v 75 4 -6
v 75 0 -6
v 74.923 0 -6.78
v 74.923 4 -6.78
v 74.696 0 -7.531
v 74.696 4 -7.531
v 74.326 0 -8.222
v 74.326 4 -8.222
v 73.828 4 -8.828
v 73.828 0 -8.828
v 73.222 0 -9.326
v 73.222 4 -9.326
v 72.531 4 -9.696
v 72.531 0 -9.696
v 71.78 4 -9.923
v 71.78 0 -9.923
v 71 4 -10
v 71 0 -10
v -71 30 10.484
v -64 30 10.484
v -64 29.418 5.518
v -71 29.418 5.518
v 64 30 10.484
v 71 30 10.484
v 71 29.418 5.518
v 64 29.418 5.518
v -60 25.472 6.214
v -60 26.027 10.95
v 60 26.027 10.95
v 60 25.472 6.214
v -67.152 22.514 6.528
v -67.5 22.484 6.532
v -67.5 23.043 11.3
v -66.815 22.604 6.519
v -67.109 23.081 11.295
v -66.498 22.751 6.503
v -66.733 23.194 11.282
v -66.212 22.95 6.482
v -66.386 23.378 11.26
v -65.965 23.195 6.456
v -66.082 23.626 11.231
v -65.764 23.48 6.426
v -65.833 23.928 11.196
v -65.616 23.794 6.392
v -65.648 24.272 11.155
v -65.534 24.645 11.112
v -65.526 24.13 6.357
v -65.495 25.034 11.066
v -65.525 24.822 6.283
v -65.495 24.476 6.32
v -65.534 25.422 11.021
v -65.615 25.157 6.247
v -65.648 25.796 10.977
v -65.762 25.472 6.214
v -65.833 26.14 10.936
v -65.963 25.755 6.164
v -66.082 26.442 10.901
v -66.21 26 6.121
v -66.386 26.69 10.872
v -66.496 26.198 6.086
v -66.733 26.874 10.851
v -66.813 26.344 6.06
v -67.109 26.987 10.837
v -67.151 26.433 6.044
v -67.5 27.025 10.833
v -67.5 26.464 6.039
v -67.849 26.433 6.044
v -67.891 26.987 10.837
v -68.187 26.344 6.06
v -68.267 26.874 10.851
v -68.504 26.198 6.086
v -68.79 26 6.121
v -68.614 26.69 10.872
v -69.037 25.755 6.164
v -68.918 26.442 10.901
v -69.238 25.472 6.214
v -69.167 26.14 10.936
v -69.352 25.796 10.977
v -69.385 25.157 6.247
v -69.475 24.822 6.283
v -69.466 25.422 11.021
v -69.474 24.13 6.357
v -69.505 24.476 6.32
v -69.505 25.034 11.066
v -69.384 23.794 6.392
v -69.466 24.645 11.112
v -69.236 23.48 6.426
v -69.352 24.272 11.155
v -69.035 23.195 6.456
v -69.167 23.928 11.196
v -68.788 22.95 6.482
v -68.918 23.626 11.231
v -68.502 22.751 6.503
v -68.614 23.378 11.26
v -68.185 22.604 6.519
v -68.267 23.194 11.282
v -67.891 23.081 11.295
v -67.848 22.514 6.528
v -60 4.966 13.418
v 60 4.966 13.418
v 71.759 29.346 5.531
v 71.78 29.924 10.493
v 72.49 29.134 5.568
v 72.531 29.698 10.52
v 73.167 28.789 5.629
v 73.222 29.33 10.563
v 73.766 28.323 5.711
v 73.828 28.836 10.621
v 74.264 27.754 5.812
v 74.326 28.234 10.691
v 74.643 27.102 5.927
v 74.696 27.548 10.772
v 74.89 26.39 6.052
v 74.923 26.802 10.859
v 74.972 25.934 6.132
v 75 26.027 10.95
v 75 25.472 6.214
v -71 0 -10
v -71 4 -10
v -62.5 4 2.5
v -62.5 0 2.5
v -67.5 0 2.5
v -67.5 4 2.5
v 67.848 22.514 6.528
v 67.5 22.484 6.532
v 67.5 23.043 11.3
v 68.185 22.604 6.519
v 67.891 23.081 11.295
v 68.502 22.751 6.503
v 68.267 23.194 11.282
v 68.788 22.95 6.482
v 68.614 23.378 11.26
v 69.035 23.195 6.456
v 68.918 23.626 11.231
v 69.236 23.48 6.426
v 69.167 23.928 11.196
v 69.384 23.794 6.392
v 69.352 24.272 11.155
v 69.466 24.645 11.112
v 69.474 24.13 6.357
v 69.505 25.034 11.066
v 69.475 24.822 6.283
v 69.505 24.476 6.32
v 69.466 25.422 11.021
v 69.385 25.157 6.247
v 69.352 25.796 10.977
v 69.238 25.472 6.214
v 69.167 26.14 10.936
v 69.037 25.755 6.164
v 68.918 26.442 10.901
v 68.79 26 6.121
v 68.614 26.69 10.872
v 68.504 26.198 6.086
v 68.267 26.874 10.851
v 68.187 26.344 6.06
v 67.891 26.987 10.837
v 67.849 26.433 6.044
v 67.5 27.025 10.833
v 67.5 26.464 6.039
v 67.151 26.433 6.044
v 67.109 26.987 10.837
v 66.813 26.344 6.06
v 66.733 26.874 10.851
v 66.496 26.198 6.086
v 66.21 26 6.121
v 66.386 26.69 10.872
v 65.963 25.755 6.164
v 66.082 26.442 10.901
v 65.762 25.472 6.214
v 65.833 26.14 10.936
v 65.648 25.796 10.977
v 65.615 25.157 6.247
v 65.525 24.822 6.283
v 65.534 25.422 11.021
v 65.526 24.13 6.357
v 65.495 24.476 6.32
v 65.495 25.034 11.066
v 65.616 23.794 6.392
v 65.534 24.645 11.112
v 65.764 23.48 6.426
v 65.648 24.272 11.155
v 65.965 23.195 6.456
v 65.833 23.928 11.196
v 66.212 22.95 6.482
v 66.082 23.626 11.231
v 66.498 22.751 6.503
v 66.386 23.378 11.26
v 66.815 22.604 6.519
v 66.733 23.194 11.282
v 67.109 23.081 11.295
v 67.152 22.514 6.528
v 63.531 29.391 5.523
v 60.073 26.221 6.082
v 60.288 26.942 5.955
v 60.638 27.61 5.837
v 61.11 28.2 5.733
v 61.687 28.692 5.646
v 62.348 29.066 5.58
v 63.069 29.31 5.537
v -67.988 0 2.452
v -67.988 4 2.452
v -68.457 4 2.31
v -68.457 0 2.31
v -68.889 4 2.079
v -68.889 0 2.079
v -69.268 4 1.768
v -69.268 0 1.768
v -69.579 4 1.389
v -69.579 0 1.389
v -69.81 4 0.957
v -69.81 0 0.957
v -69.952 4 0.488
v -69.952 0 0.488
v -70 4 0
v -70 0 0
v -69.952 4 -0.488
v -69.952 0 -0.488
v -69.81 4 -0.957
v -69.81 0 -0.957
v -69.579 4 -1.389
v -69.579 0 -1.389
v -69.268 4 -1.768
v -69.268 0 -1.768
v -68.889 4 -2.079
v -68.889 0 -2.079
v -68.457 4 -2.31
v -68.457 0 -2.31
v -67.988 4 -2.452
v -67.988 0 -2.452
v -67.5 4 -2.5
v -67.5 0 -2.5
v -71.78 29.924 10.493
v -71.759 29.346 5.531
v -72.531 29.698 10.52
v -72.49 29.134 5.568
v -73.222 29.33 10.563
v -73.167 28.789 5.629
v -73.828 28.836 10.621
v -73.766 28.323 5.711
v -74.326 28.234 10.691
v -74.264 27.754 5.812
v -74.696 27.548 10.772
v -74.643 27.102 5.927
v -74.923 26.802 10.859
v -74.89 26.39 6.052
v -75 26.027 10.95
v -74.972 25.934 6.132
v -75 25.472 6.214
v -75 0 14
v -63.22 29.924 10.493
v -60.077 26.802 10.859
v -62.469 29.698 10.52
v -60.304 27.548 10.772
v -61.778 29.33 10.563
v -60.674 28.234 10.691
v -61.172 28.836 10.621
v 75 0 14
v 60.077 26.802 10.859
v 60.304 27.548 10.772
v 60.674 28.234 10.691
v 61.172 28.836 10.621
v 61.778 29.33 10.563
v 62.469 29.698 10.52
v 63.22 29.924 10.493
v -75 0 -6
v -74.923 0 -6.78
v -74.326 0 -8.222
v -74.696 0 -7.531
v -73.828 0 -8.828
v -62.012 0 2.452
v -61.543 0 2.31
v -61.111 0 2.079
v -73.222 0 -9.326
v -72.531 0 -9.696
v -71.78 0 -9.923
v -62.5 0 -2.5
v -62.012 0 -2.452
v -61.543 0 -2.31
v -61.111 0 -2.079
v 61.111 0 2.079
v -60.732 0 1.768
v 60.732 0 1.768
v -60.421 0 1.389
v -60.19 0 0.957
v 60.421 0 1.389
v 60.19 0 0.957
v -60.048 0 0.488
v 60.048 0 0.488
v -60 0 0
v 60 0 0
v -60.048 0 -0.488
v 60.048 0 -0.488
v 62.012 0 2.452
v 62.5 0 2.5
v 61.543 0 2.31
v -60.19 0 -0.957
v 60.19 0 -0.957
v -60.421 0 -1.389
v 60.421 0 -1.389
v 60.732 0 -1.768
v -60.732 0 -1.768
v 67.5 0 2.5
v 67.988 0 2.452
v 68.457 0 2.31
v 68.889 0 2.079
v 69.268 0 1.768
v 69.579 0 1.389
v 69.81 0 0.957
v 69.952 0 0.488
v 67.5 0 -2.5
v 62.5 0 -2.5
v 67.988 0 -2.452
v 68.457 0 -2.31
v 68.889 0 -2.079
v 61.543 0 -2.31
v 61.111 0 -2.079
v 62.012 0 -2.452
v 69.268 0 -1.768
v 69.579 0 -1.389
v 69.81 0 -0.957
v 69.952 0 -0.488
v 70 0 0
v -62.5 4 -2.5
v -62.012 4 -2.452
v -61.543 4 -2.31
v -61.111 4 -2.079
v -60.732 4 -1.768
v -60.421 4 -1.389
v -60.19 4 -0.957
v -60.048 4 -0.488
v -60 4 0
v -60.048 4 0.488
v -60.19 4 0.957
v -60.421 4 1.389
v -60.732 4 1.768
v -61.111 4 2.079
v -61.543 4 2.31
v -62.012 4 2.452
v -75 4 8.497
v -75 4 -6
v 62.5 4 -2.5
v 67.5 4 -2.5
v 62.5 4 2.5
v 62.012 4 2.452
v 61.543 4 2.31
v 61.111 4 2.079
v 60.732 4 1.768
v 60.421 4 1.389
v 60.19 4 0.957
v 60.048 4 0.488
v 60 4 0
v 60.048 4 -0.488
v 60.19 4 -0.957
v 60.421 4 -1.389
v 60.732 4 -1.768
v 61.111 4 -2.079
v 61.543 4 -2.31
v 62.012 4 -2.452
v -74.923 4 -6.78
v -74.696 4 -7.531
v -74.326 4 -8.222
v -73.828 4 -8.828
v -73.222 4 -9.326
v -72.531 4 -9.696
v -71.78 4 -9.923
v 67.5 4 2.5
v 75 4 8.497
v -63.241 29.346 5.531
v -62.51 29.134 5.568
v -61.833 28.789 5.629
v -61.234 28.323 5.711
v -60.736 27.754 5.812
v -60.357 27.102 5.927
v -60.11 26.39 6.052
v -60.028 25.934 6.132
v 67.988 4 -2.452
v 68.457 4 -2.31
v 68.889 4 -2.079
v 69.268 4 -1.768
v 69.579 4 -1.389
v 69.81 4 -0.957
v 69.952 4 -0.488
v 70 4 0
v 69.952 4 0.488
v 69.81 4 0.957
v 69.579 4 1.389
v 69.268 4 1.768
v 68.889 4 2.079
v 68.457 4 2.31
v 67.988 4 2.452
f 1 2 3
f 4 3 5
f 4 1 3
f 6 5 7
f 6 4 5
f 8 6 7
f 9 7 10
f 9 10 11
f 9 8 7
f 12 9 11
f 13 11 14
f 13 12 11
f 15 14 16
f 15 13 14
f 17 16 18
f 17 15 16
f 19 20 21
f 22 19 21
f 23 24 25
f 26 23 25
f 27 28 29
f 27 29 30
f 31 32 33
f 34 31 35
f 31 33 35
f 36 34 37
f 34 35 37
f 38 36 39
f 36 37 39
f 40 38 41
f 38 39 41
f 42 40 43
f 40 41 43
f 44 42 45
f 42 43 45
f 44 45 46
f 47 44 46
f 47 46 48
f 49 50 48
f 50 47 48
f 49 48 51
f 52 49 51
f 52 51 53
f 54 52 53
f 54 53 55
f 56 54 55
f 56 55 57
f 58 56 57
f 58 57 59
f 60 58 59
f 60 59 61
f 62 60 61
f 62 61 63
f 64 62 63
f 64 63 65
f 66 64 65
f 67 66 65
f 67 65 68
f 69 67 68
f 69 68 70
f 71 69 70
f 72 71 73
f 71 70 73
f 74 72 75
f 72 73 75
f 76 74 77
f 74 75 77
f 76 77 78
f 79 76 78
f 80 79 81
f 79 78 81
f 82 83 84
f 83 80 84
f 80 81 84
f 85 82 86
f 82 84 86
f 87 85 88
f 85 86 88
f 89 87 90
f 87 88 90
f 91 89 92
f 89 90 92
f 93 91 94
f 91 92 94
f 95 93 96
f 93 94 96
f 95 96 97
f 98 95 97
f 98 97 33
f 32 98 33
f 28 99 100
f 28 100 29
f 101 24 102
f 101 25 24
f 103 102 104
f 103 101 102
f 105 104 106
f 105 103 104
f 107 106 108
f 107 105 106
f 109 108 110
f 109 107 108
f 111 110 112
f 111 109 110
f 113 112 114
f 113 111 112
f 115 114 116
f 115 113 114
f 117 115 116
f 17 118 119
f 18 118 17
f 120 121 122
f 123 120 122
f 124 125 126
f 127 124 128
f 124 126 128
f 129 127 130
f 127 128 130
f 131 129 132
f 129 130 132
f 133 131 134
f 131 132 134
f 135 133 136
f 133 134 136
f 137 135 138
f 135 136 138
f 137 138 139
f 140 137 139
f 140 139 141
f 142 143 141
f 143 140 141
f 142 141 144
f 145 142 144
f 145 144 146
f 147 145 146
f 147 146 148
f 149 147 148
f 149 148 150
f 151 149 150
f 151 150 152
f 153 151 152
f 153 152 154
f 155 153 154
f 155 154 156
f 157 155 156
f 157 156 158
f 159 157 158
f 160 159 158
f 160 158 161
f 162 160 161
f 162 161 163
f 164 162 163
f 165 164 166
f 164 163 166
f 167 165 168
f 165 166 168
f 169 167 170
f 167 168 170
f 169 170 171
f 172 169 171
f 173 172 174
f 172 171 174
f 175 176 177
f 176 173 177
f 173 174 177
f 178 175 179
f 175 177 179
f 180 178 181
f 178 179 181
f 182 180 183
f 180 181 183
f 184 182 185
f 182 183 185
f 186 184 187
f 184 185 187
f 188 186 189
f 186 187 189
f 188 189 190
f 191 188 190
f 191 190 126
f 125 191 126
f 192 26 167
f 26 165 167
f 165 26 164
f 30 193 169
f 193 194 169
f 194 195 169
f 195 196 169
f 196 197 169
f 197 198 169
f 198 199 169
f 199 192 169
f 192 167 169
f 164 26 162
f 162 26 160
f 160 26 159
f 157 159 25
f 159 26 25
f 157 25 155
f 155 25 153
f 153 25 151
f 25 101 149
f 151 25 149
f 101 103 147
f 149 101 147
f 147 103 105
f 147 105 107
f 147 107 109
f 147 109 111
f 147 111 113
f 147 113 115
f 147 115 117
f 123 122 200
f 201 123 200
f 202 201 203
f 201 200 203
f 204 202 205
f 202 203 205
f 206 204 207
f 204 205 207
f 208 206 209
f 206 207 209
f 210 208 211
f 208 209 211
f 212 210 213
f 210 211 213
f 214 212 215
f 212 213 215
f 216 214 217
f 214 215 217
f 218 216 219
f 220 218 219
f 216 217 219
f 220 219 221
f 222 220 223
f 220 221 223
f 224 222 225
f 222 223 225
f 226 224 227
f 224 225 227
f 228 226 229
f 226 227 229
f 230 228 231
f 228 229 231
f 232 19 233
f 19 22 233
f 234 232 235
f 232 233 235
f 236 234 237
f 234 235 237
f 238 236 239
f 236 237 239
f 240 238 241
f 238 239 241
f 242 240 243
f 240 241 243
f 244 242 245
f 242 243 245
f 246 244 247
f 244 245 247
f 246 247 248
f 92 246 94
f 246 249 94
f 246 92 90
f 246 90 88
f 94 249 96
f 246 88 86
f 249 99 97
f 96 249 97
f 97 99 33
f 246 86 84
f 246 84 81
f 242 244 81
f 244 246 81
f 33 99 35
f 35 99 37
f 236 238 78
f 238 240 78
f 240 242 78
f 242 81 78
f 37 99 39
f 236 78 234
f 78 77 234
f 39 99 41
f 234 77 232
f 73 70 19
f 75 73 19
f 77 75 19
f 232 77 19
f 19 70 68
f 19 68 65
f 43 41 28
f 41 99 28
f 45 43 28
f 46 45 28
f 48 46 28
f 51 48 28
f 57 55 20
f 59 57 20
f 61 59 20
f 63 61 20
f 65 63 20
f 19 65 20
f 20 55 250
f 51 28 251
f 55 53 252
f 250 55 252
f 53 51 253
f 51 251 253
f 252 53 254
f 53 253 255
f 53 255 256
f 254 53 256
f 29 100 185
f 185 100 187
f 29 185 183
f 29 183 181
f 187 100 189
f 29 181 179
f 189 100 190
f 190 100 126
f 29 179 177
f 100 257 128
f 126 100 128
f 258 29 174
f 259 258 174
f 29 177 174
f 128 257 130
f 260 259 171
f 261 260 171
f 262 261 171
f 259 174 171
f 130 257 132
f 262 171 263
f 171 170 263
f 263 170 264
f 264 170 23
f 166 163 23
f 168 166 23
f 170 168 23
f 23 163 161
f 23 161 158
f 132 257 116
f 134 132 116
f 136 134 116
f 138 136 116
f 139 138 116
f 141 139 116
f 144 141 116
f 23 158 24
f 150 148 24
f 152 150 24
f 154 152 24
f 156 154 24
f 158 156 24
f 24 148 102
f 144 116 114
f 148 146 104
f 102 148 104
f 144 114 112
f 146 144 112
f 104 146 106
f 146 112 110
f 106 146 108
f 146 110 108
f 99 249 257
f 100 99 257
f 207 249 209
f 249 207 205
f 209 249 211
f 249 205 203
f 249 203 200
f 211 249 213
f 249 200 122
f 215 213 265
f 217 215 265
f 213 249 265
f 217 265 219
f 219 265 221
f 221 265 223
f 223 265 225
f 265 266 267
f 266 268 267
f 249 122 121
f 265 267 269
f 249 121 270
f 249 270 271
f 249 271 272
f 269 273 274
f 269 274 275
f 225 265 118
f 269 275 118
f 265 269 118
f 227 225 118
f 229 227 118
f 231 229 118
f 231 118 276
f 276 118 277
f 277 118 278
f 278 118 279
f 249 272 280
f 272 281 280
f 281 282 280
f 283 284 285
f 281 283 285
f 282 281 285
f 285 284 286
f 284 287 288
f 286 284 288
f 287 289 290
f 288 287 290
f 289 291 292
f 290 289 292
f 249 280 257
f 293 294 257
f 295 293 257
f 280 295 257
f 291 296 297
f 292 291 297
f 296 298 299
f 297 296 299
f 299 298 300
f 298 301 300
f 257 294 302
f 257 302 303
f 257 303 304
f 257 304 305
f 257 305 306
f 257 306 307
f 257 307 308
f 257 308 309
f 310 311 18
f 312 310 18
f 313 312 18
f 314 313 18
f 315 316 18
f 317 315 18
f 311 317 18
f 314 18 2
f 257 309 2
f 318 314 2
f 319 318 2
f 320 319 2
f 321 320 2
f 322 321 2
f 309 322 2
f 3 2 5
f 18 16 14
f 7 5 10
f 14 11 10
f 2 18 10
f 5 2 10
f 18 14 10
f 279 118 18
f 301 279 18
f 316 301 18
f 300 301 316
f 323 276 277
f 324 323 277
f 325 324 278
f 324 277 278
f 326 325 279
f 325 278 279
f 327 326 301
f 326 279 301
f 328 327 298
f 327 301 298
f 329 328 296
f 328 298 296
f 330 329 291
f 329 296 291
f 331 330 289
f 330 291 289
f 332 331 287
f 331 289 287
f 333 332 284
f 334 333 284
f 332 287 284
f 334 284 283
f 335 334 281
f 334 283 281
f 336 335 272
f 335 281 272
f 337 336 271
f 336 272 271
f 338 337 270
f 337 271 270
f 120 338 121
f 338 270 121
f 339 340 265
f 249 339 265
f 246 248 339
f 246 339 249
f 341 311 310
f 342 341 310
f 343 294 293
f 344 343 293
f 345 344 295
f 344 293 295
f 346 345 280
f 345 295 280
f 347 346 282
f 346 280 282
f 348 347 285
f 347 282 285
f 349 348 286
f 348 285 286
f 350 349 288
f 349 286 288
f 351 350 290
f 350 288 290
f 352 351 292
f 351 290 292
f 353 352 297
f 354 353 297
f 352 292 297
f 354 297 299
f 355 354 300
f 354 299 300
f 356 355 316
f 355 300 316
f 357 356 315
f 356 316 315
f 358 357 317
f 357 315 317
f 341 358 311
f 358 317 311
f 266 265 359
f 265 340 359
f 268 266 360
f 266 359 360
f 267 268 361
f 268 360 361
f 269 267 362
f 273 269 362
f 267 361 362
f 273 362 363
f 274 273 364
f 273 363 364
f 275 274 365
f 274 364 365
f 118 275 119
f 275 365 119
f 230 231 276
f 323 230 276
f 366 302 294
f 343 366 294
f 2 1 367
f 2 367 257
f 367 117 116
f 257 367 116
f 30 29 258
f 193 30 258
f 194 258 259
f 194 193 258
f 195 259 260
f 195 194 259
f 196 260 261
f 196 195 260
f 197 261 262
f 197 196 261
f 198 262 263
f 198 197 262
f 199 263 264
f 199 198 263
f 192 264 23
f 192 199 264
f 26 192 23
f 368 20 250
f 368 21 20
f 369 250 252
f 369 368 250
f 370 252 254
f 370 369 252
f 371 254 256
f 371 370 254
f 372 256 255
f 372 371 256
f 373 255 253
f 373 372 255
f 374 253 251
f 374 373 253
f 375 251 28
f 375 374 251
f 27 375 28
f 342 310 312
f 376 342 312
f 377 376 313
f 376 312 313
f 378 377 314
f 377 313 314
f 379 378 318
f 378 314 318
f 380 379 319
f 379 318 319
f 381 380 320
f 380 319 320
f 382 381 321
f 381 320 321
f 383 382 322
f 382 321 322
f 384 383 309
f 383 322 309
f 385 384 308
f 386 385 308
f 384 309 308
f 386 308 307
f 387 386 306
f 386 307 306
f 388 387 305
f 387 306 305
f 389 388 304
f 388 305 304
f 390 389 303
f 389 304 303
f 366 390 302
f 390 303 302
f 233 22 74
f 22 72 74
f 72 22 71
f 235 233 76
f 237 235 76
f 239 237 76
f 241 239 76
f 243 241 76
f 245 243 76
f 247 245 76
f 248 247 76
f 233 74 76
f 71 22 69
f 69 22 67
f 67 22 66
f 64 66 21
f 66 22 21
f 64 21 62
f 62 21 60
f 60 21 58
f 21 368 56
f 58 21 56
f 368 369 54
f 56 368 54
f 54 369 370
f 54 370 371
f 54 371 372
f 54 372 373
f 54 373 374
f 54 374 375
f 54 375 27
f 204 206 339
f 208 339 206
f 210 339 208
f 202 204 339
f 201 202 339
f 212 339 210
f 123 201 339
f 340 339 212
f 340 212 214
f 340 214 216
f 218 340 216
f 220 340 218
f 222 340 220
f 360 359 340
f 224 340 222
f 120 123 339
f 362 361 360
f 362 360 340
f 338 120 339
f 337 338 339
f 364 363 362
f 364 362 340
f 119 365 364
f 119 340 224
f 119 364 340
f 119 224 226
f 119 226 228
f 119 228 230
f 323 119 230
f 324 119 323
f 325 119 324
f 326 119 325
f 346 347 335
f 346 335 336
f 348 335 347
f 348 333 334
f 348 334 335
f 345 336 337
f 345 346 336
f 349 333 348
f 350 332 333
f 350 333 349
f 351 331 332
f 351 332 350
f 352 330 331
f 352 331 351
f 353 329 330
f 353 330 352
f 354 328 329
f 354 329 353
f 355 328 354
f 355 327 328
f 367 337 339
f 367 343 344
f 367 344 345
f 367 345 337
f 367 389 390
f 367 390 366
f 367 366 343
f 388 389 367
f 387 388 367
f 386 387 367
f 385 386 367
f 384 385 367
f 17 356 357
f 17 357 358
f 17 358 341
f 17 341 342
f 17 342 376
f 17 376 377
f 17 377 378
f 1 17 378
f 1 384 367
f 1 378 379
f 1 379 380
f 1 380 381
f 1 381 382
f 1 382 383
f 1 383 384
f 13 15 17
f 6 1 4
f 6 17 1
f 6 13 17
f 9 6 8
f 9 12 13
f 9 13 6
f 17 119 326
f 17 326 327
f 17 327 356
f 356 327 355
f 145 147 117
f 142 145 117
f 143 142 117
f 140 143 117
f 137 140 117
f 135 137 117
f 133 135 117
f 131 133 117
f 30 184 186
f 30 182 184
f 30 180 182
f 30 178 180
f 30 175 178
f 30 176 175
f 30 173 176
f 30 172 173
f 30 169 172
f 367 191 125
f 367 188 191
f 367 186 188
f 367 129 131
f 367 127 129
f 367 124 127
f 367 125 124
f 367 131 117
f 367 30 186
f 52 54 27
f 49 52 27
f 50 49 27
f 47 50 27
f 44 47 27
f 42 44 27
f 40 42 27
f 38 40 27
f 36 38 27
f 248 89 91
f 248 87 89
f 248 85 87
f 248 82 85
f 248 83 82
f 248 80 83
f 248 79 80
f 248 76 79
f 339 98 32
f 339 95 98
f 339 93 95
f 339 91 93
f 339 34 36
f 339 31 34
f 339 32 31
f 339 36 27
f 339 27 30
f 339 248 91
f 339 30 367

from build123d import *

# Parameters (mm, degrees)
SKETCH1_W           = 150
SKETCH1_H           = 20
BOSS_EXTRUDE1_DEPTH = 4
BOSS_EXTRUDE3_DEPTH = 150
FILLET1_R           = 4
SKETCH4_W           = 120
SKETCH4_H           = 25.205319461
CUT_EXTRUDE1_DEPTH  = 10
FILLET2_R           = 4
FILLET3_R           = 4
SKETCH6_W           = 124
SKETCH6_H           = 7.02135472
BOSS_EXTRUDE4_DEPTH = 4
BOSS_EXTRUDE5_START = -150
BOSS_EXTRUDE5_DEPTH = 150
SKETCH5_R           = 2.005
CUT_EXTRUDE2_DEPTH  = 10


with BuildPart() as part:
    # Sketch1 → Boss-Extrude1 (new body)
    with BuildSketch(Plane(origin=(0, 0, 0), x_dir=(1, 0, 0), z_dir=(0, 1, 0))):
        Rectangle(SKETCH1_W, SKETCH1_H)
        with BuildLine():
            Line((-67.5, 2.5), (-62.5, 2.5))
            ThreePointArc((-62.5, 2.5), (-60, 0), (-62.5, -2.5))
            Line((-62.5, -2.5), (-67.5, -2.5))
            ThreePointArc((-67.5, -2.5), (-70, 0), (-67.5, 2.5))
        make_face(mode=Mode.SUBTRACT)
        with BuildLine():
            Line((62.5, 2.5), (67.5, 2.5))
            ThreePointArc((67.5, 2.5), (70, 0), (67.5, -2.5))
            Line((67.5, -2.5), (62.5, -2.5))
            ThreePointArc((62.5, -2.5), (60, 0), (62.5, 2.5))
        make_face(mode=Mode.SUBTRACT)
    extrude(amount=BOSS_EXTRUDE1_DEPTH)

    # Sketch3 → Boss-Extrude3 (add)
    with BuildSketch(Plane(origin=(75, 0, 0), x_dir=(0, 0, -1), z_dir=(1, 0, 0))):
        Polygon((-10, 0), (-14, 0), (-10.484132576, 30), (-5.518119877, 29.418005257), (-10, 4), align=None)
    extrude(amount=-BOSS_EXTRUDE3_DEPTH)

    # Fillet1
    fillet1_edges = [part.edges().sort_by_distance(p)[0] for p in [
        (75, 29.709002629, 8.001126226),
        (-75, 29.709002629, 8.001126226),
    ]]
    fillet(fillet1_edges, radius=FILLET1_R)

    # Sketch4 → Cut-Extrude1 (cut)
    with BuildSketch(Plane(origin=(0, 1.618508238, 13.810317987), x_dir=(1, 0, 0), z_dir=(0, 0.11639894850026859, 0.9932025396604823))):
        with Locations((0, 15.973074452)):
            Rectangle(SKETCH4_W, SKETCH4_H)
    extrude(amount=-CUT_EXTRUDE1_DEPTH, mode=Mode.SUBTRACT)

    # Fillet2
    fillet2_edges = [part.edges().sort_by_distance(p)[0] for p in [
        (-60, 29.709002629, 8.001126226),
        (60, 29.709002629, 8.001126226),
    ]]
    fillet(fillet2_edges, radius=FILLET2_R)

    # Fillet3
    fillet3_edges = [part.edges().sort_by_distance(p)[0] for p in [
        (-75, 2, -10),
        (75, 2, -10),
    ]]
    fillet(fillet3_edges, radius=FILLET3_R)

    # Sketch6 → Boss-Extrude4 (add)
    with BuildSketch(Plane(origin=(0, 4, 0), x_dir=(1, 0, 0), z_dir=(0, 1, 0))):
        with Locations((2, -6.973455216)):
            Rectangle(SKETCH6_W, SKETCH6_H)
    extrude(amount=-BOSS_EXTRUDE4_DEPTH)

    # Sketch8 → Boss-Extrude5 (add)
    with BuildSketch(Plane(origin=(75, 0, 0), x_dir=(0, 0, -1), z_dir=(1, 0, 0)).offset(BOSS_EXTRUDE5_START)):
        Polygon((-6.213877267, 25.472169021), (-8.496997767, 4), (-13.531217677, 4), (-10.94972837, 26.027189841), align=None)
    extrude(amount=BOSS_EXTRUDE5_DEPTH)

    # Sketch5 → Cut-Extrude2 (cut)
    with BuildSketch(Plane(origin=(0, 1.618508238, 13.810317987), x_dir=(1, 0, 0), z_dir=(0, 0.11639894850026859, 0.9932025396604823))):
        with Locations(Location((-67.5, 23.575734182, 0), (0, 0, 270))):
            Circle(SKETCH5_R)
        with Locations(Location((67.5, 23.575734182, 0), (0, 0, 270))):
            Circle(SKETCH5_R)
    extrude(amount=-CUT_EXTRUDE2_DEPTH, mode=Mode.SUBTRACT)


solid = part.part
